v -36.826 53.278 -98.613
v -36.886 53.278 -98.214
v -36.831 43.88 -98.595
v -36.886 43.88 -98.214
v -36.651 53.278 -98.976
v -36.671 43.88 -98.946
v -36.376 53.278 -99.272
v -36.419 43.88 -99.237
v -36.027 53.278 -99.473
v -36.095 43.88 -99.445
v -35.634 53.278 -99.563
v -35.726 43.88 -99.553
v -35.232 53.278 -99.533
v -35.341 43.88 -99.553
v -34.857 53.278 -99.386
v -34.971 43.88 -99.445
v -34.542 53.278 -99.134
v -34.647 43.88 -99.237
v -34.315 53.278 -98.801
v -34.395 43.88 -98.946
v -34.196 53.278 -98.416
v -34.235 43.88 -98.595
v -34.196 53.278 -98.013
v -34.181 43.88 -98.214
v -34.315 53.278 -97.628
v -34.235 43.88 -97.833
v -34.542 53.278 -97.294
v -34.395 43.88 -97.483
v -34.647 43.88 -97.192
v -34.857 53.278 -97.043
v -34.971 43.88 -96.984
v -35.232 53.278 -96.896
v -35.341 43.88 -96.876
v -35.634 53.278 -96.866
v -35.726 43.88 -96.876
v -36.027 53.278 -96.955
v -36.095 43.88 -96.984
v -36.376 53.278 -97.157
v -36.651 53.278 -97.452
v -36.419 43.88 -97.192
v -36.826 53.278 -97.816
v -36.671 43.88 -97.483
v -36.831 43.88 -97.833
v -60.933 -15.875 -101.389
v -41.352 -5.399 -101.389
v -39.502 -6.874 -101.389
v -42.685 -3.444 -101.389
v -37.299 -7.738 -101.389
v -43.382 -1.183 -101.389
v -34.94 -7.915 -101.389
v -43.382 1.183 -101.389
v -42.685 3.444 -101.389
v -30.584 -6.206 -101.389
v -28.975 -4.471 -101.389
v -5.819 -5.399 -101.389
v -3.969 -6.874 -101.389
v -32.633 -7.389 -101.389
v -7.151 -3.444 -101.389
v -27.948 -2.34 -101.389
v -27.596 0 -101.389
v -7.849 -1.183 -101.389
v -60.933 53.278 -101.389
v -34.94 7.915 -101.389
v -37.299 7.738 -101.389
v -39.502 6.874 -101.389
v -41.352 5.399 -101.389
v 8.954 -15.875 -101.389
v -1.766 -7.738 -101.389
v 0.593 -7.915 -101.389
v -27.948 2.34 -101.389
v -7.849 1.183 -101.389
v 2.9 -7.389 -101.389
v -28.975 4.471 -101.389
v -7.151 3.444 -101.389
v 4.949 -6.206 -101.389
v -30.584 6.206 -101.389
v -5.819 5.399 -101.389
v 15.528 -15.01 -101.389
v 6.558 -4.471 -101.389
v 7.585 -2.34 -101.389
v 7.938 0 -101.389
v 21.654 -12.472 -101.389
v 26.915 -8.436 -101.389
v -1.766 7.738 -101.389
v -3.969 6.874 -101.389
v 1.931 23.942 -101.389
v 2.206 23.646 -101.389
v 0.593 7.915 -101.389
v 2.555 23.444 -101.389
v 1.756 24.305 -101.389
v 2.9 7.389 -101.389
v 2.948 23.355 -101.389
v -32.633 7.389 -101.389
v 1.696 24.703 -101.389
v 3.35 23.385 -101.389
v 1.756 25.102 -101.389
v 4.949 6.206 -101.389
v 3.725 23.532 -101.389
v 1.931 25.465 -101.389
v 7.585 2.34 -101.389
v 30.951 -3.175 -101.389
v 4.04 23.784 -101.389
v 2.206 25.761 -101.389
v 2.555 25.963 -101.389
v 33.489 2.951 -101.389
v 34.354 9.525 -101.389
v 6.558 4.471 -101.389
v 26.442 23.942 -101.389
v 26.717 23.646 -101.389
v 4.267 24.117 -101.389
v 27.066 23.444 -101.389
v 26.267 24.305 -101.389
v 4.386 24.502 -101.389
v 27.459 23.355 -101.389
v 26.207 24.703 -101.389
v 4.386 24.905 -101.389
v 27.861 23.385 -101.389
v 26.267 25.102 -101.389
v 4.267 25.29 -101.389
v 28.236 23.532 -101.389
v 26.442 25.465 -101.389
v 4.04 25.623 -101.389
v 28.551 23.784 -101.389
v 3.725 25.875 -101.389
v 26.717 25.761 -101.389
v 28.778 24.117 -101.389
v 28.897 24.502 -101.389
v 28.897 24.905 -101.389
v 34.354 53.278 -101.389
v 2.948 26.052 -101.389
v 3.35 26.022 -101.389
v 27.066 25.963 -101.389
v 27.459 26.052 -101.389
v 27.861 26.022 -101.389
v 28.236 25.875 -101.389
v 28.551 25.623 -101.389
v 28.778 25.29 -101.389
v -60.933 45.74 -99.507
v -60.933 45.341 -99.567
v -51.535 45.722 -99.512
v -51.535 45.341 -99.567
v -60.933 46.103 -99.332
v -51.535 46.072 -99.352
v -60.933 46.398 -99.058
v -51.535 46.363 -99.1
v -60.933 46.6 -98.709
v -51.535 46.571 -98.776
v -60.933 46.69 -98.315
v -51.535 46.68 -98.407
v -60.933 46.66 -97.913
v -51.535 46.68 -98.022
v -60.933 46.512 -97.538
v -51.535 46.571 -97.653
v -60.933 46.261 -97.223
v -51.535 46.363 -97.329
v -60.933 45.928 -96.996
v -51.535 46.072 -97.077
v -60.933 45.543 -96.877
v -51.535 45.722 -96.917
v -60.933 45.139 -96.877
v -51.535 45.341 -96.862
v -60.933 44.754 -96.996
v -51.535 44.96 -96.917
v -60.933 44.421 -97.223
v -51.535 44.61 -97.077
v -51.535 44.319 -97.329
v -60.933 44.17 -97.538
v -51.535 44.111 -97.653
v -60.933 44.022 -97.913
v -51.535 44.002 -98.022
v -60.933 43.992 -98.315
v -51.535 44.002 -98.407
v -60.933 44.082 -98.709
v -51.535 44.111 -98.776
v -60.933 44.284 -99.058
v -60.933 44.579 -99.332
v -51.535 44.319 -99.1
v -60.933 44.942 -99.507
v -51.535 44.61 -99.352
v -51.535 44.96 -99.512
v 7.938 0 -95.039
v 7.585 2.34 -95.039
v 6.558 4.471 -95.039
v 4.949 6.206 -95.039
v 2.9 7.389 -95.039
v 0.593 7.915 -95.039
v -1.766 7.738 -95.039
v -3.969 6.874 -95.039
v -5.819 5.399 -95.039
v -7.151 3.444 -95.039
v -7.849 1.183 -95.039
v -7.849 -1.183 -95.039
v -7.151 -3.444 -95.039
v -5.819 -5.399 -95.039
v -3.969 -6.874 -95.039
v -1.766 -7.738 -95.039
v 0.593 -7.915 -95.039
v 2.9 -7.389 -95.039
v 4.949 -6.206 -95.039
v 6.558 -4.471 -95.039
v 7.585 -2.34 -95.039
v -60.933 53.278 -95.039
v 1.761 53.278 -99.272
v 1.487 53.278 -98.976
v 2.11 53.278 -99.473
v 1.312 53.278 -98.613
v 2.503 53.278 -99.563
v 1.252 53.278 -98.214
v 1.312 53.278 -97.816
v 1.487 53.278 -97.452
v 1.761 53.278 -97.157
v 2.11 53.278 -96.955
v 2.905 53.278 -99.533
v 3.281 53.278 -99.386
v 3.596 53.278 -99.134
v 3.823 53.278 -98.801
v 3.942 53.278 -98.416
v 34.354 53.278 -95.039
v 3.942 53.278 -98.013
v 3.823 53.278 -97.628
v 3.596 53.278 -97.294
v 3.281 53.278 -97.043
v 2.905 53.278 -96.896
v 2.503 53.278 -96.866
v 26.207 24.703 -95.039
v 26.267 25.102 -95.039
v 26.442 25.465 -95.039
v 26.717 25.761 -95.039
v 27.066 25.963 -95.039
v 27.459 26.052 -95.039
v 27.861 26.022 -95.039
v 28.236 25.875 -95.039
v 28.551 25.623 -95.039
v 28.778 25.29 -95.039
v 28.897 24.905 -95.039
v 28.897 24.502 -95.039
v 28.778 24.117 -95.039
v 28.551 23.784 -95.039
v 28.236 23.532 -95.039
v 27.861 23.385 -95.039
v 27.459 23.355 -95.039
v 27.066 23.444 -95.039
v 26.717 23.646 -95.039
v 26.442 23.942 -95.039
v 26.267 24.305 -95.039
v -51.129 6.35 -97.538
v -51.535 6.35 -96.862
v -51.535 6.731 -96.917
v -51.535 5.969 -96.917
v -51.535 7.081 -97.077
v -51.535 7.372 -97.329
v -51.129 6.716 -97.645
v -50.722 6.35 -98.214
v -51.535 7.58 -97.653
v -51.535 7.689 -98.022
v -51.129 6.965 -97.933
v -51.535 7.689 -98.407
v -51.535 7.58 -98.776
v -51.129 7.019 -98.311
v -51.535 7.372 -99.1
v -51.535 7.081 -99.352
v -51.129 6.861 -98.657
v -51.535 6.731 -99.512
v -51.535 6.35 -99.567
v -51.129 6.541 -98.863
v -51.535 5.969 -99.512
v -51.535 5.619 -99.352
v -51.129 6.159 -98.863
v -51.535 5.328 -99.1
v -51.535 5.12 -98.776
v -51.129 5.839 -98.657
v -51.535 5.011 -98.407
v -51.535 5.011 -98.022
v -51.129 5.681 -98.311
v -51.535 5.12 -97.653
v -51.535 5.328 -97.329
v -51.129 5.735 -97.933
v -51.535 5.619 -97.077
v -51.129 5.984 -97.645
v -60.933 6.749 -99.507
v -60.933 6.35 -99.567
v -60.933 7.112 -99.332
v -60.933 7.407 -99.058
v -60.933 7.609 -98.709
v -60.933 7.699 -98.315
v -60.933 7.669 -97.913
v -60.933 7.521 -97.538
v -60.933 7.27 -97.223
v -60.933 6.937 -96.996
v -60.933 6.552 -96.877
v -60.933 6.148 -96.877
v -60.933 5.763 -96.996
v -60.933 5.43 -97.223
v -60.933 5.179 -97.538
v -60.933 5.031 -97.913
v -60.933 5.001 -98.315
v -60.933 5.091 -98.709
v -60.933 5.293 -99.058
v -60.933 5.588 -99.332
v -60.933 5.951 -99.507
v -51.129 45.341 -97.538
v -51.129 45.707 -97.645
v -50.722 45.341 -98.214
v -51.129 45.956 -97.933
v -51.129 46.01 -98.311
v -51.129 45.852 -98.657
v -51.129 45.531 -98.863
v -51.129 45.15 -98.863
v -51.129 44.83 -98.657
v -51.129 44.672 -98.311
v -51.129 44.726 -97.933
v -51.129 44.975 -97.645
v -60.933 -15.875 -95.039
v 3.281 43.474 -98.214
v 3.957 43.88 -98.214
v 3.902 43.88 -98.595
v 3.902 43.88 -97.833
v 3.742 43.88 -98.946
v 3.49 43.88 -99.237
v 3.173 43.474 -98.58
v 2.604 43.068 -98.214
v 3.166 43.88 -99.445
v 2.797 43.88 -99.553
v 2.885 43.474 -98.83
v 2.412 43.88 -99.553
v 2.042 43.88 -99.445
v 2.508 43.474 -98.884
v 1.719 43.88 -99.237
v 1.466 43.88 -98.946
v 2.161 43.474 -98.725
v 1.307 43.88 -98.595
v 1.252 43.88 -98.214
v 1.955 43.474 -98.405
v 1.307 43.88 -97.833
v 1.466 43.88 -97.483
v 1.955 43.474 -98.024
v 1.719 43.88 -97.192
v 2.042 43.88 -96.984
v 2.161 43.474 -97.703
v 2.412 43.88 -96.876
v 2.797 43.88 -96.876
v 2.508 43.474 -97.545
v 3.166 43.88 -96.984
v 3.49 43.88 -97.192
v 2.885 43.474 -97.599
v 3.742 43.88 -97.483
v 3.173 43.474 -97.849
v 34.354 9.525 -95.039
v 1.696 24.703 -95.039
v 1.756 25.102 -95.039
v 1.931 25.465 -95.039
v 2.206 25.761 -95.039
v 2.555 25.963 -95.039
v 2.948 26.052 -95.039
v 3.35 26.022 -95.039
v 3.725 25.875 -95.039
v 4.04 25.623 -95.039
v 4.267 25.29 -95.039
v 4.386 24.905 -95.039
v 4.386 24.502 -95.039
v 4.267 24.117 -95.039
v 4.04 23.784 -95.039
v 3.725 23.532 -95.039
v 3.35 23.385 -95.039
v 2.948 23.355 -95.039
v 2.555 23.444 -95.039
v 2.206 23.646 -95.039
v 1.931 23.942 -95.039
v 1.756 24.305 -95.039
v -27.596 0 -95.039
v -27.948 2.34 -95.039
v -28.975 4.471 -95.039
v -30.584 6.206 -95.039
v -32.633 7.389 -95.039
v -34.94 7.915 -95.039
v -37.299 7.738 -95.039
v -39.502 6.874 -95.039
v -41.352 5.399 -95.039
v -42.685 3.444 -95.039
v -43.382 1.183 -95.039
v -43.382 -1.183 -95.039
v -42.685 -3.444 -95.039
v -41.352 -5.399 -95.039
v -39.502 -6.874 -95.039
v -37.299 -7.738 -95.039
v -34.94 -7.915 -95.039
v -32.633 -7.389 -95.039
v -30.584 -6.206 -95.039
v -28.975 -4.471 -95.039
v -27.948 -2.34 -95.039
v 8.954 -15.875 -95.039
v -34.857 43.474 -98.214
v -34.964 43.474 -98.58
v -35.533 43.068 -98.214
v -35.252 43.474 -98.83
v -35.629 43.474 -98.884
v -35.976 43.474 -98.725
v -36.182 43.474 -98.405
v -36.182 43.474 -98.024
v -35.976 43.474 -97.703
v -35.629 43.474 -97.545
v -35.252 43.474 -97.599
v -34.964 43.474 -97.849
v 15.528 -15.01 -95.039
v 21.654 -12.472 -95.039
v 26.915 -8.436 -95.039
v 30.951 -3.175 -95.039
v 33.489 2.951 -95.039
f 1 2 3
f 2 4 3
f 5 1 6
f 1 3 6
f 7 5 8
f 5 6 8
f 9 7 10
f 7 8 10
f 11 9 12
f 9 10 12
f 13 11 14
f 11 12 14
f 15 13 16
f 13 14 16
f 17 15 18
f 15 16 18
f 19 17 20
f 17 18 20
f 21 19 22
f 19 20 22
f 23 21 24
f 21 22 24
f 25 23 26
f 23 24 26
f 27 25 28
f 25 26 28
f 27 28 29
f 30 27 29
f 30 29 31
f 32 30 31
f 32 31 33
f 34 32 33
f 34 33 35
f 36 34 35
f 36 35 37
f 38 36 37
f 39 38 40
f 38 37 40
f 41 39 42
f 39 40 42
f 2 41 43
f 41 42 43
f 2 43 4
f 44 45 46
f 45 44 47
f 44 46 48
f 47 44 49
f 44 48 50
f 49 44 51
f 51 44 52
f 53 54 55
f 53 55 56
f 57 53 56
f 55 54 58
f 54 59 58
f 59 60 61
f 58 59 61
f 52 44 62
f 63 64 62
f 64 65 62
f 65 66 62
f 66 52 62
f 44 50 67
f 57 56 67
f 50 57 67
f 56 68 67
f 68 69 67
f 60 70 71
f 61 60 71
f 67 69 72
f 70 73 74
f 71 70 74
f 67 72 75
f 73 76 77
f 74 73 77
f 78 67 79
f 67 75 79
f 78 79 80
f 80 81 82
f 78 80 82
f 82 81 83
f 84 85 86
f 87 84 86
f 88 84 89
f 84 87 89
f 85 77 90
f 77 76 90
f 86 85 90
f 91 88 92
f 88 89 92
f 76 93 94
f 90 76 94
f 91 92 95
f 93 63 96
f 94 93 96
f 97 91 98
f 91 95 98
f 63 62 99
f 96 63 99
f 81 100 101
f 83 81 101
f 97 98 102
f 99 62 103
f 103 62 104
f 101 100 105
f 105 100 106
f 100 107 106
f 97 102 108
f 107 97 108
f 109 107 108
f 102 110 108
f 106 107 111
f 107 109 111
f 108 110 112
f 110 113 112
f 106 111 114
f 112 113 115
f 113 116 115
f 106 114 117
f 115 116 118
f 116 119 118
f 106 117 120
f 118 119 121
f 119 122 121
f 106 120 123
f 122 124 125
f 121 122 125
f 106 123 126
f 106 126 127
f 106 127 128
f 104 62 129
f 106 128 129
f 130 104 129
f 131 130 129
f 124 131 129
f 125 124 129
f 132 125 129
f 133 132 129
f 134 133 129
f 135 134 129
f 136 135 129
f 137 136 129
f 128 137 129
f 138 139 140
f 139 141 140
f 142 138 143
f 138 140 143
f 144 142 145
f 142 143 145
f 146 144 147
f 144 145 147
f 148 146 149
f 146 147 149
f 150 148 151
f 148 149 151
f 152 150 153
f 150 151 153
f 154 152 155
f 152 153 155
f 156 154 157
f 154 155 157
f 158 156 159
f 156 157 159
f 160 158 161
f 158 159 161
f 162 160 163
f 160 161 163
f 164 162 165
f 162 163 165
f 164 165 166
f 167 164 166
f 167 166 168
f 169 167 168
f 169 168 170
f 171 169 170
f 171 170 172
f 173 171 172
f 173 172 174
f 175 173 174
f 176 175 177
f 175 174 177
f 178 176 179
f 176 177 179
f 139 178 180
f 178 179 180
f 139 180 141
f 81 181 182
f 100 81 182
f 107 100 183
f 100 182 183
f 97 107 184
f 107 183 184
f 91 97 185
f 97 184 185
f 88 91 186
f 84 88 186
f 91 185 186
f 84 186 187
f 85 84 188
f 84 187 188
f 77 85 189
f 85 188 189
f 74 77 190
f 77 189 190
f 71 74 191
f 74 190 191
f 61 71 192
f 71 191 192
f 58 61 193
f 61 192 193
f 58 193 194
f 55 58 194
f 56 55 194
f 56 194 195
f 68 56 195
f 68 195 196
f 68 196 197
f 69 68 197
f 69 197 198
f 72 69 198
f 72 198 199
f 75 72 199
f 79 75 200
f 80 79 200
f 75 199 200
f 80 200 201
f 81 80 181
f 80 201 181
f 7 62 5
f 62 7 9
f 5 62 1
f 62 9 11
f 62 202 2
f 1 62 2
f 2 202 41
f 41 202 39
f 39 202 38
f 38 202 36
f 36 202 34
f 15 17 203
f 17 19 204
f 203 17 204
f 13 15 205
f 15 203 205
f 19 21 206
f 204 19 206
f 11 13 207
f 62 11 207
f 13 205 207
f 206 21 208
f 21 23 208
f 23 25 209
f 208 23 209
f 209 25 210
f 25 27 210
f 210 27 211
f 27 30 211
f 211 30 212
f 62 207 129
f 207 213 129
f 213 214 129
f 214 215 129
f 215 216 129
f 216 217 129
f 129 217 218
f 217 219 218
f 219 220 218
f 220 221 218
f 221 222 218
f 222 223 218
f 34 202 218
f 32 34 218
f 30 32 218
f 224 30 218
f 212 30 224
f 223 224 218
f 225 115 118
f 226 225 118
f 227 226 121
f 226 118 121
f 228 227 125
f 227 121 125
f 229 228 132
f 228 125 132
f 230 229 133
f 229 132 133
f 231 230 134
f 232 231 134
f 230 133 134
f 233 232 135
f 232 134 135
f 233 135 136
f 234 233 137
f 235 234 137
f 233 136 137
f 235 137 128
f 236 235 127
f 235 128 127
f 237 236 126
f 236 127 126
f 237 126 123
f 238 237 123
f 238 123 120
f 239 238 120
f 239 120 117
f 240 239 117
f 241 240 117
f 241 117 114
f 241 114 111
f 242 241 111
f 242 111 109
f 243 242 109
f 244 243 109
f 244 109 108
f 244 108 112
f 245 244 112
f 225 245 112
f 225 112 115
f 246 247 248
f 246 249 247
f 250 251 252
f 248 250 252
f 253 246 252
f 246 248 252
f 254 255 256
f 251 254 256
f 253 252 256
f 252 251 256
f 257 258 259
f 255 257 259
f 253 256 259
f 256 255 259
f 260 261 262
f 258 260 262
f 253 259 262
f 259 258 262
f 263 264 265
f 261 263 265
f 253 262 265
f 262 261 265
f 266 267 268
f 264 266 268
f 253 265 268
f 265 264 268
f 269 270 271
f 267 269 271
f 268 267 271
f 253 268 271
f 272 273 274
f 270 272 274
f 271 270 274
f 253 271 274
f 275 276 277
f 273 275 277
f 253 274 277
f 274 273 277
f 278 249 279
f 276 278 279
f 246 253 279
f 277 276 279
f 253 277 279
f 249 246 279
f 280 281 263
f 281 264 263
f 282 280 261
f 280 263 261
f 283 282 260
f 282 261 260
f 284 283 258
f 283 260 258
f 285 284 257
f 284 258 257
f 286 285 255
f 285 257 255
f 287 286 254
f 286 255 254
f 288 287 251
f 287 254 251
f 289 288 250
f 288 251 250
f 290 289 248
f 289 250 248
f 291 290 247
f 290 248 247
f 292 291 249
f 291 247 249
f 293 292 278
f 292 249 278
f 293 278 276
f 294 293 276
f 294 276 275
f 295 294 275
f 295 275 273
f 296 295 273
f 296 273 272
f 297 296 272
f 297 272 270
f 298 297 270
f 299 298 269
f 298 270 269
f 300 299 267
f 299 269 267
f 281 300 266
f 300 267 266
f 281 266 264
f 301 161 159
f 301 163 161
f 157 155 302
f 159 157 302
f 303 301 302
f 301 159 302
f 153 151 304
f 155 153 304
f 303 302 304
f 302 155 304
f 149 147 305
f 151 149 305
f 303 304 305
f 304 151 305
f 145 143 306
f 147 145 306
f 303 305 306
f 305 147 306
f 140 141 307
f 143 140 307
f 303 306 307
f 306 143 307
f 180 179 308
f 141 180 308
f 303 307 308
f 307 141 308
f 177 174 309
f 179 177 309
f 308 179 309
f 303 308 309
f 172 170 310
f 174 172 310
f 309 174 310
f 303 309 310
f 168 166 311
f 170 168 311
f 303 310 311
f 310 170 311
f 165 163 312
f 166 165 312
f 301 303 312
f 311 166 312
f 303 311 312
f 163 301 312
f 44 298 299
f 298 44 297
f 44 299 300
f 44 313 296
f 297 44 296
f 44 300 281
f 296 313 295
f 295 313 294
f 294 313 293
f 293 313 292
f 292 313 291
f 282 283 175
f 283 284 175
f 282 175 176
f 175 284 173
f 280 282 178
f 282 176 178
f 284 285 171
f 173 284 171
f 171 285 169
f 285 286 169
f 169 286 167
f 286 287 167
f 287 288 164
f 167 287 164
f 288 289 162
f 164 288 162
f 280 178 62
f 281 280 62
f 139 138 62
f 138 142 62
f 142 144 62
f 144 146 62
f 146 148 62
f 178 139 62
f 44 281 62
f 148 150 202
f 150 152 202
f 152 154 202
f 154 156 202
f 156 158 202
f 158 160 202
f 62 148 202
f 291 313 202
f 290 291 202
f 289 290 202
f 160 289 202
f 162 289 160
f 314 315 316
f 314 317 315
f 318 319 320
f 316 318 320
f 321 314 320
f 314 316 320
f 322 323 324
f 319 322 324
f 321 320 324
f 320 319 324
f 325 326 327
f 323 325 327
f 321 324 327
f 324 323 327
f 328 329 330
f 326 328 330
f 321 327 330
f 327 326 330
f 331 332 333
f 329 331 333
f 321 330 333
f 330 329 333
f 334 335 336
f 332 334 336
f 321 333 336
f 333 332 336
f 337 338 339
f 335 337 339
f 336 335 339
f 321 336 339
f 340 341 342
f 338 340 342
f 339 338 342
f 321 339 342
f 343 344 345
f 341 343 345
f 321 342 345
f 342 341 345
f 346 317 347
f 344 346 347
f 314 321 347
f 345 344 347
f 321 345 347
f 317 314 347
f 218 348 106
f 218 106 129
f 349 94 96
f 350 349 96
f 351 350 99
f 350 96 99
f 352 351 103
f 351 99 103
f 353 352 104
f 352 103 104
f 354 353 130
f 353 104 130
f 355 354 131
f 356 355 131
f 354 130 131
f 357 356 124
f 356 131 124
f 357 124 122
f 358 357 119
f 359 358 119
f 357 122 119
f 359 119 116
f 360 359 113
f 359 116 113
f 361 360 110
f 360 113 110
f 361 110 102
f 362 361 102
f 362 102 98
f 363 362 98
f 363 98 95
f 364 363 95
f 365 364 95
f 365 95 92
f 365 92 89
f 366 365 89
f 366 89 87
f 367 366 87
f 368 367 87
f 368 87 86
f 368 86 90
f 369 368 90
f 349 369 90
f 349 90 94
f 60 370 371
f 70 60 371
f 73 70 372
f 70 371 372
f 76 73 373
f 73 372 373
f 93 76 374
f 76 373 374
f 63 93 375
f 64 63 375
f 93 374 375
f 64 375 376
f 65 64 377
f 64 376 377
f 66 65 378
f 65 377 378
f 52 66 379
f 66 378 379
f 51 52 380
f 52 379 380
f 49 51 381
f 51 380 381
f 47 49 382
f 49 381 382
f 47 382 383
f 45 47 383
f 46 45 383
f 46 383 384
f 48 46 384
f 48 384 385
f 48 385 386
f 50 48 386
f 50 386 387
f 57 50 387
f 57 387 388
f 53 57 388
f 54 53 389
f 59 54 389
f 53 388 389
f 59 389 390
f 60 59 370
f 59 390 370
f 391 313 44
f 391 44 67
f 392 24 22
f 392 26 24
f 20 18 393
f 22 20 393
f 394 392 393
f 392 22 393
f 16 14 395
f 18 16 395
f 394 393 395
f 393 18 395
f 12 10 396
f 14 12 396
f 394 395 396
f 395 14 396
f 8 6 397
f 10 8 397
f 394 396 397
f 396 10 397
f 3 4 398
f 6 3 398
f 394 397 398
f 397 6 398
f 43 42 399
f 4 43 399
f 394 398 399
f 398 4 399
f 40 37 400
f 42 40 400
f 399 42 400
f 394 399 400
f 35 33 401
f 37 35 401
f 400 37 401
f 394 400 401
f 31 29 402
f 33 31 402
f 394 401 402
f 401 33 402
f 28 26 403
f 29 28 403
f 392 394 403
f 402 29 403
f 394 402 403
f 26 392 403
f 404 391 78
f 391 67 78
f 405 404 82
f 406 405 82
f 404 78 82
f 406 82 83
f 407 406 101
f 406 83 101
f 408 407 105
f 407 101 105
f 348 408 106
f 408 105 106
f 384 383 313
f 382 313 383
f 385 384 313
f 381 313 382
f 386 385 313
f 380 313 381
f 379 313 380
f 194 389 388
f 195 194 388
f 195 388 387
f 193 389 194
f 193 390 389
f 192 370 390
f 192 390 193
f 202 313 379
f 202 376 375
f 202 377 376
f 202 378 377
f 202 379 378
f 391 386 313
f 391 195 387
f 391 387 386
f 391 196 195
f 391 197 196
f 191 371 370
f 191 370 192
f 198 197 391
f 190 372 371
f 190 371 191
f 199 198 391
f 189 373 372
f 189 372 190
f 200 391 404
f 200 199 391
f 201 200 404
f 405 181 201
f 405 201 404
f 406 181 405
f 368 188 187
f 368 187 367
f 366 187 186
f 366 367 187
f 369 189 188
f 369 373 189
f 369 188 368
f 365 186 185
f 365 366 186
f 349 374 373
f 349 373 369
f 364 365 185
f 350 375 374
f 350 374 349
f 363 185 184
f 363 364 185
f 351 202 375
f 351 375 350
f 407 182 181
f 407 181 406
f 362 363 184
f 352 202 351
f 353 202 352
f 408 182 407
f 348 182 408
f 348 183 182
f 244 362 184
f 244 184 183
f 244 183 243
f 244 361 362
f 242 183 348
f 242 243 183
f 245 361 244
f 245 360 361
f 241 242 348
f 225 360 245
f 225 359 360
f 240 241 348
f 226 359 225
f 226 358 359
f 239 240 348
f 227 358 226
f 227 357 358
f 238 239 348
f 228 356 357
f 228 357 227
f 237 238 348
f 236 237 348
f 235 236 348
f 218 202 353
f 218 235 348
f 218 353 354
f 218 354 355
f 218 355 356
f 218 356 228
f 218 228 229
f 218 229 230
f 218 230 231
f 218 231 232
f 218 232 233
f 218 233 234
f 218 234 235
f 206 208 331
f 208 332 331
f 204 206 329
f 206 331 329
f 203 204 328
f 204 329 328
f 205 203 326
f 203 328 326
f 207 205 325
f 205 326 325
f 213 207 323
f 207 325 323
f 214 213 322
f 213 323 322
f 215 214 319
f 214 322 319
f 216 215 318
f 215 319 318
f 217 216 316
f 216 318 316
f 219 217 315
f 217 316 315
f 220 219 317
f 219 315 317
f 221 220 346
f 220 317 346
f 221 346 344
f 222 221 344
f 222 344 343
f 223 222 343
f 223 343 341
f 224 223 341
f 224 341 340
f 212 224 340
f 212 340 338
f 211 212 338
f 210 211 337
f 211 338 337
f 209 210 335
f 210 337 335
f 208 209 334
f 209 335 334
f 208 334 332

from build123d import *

# Parameters (mm, degrees)
SKETCH1_W                 = 95.287460045
SKETCH1_H                 = 69.153467802
SKETCH1_R                 = 7.9375
BOSS_EXTRUDE1_DEPTH       = 6.35
FILLET1_R                 = 25.4
F_6_32_TAPPED_HOLE1_D     = 2.7051
F_6_32_TAPPED_HOLE1_DEPTH = 10.9728
F_6_32_TAPPED_HOLE1_TIP   = 0.81269403
F_6_32_TAPPED_HOLE2_D     = 2.7051
F_6_32_TAPPED_HOLE2_DEPTH = 9.398
F_6_32_TAPPED_HOLE2_TIP   = 0.81269403
F_6_32_TAPPED_HOLE3_D     = 2.7051
F_6_32_TAPPED_HOLE3_DEPTH = 9.398
F_6_32_TAPPED_HOLE3_TIP   = 0.81269403


with BuildPart() as part:
    # Sketch1 → Boss-Extrude1 (new body)
    with BuildSketch(Plane.XY.offset(-95.039403682)):
        with Locations((-13.289407805, 18.701733901)):
            Rectangle(SKETCH1_W, SKETCH1_H)
        Circle(SKETCH1_R, mode=Mode.SUBTRACT)
        with Locations((-35.533137827, 0)):
            Circle(SKETCH1_R, mode=Mode.SUBTRACT)
    extrude(amount=-BOSS_EXTRUDE1_DEPTH)

    # Fillet1
    fillet1_edges = [part.edges().sort_by_distance(p)[0] for p in [
        (34.354322218, -15.875, -98.214403682),
    ]]
    fillet(fillet1_edges, radius=FILLET1_R)

    # #6-32 Tapped Hole1
    with Locations(Plane.XY.offset(-95.039403682)):
        with Locations((27.559822218, 24.703467802), (3.048822218, 24.703467802)):
            Hole(F_6_32_TAPPED_HOLE1_D / 2, depth=F_6_32_TAPPED_HOLE1_DEPTH)
            with Locations((0, 0, -(F_6_32_TAPPED_HOLE1_DEPTH + F_6_32_TAPPED_HOLE1_TIP / 2))):  # 118° drill point
                Cone(0, F_6_32_TAPPED_HOLE1_D / 2, F_6_32_TAPPED_HOLE1_TIP, mode=Mode.SUBTRACT)

    # #6-32 Tapped Hole2
    with Locations(Plane(origin=(0, 53.278467802, 0), x_dir=(1, 0, 0), z_dir=(0, 1, 0))):
        with Locations((-35.533137827, 98.214403682), (2.604322218, 98.214403682)):
            Hole(F_6_32_TAPPED_HOLE2_D / 2, depth=F_6_32_TAPPED_HOLE2_DEPTH)
            with Locations((0, 0, -(F_6_32_TAPPED_HOLE2_DEPTH + F_6_32_TAPPED_HOLE2_TIP / 2))):  # 118° drill point
                Cone(0, F_6_32_TAPPED_HOLE2_D / 2, F_6_32_TAPPED_HOLE2_TIP, mode=Mode.SUBTRACT)

    # #6-32 Tapped Hole3
    with Locations(Plane.ZY.offset(60.933137827)):
        with Locations((-98.214403682, 45.340967802), (-98.214403682, 6.35)):
            Hole(F_6_32_TAPPED_HOLE3_D / 2, depth=F_6_32_TAPPED_HOLE3_DEPTH)
            with Locations((0, 0, -(F_6_32_TAPPED_HOLE3_DEPTH + F_6_32_TAPPED_HOLE3_TIP / 2))):  # 118° drill point
                Cone(0, F_6_32_TAPPED_HOLE3_D / 2, F_6_32_TAPPED_HOLE3_TIP, mode=Mode.SUBTRACT)


solid = part.part
